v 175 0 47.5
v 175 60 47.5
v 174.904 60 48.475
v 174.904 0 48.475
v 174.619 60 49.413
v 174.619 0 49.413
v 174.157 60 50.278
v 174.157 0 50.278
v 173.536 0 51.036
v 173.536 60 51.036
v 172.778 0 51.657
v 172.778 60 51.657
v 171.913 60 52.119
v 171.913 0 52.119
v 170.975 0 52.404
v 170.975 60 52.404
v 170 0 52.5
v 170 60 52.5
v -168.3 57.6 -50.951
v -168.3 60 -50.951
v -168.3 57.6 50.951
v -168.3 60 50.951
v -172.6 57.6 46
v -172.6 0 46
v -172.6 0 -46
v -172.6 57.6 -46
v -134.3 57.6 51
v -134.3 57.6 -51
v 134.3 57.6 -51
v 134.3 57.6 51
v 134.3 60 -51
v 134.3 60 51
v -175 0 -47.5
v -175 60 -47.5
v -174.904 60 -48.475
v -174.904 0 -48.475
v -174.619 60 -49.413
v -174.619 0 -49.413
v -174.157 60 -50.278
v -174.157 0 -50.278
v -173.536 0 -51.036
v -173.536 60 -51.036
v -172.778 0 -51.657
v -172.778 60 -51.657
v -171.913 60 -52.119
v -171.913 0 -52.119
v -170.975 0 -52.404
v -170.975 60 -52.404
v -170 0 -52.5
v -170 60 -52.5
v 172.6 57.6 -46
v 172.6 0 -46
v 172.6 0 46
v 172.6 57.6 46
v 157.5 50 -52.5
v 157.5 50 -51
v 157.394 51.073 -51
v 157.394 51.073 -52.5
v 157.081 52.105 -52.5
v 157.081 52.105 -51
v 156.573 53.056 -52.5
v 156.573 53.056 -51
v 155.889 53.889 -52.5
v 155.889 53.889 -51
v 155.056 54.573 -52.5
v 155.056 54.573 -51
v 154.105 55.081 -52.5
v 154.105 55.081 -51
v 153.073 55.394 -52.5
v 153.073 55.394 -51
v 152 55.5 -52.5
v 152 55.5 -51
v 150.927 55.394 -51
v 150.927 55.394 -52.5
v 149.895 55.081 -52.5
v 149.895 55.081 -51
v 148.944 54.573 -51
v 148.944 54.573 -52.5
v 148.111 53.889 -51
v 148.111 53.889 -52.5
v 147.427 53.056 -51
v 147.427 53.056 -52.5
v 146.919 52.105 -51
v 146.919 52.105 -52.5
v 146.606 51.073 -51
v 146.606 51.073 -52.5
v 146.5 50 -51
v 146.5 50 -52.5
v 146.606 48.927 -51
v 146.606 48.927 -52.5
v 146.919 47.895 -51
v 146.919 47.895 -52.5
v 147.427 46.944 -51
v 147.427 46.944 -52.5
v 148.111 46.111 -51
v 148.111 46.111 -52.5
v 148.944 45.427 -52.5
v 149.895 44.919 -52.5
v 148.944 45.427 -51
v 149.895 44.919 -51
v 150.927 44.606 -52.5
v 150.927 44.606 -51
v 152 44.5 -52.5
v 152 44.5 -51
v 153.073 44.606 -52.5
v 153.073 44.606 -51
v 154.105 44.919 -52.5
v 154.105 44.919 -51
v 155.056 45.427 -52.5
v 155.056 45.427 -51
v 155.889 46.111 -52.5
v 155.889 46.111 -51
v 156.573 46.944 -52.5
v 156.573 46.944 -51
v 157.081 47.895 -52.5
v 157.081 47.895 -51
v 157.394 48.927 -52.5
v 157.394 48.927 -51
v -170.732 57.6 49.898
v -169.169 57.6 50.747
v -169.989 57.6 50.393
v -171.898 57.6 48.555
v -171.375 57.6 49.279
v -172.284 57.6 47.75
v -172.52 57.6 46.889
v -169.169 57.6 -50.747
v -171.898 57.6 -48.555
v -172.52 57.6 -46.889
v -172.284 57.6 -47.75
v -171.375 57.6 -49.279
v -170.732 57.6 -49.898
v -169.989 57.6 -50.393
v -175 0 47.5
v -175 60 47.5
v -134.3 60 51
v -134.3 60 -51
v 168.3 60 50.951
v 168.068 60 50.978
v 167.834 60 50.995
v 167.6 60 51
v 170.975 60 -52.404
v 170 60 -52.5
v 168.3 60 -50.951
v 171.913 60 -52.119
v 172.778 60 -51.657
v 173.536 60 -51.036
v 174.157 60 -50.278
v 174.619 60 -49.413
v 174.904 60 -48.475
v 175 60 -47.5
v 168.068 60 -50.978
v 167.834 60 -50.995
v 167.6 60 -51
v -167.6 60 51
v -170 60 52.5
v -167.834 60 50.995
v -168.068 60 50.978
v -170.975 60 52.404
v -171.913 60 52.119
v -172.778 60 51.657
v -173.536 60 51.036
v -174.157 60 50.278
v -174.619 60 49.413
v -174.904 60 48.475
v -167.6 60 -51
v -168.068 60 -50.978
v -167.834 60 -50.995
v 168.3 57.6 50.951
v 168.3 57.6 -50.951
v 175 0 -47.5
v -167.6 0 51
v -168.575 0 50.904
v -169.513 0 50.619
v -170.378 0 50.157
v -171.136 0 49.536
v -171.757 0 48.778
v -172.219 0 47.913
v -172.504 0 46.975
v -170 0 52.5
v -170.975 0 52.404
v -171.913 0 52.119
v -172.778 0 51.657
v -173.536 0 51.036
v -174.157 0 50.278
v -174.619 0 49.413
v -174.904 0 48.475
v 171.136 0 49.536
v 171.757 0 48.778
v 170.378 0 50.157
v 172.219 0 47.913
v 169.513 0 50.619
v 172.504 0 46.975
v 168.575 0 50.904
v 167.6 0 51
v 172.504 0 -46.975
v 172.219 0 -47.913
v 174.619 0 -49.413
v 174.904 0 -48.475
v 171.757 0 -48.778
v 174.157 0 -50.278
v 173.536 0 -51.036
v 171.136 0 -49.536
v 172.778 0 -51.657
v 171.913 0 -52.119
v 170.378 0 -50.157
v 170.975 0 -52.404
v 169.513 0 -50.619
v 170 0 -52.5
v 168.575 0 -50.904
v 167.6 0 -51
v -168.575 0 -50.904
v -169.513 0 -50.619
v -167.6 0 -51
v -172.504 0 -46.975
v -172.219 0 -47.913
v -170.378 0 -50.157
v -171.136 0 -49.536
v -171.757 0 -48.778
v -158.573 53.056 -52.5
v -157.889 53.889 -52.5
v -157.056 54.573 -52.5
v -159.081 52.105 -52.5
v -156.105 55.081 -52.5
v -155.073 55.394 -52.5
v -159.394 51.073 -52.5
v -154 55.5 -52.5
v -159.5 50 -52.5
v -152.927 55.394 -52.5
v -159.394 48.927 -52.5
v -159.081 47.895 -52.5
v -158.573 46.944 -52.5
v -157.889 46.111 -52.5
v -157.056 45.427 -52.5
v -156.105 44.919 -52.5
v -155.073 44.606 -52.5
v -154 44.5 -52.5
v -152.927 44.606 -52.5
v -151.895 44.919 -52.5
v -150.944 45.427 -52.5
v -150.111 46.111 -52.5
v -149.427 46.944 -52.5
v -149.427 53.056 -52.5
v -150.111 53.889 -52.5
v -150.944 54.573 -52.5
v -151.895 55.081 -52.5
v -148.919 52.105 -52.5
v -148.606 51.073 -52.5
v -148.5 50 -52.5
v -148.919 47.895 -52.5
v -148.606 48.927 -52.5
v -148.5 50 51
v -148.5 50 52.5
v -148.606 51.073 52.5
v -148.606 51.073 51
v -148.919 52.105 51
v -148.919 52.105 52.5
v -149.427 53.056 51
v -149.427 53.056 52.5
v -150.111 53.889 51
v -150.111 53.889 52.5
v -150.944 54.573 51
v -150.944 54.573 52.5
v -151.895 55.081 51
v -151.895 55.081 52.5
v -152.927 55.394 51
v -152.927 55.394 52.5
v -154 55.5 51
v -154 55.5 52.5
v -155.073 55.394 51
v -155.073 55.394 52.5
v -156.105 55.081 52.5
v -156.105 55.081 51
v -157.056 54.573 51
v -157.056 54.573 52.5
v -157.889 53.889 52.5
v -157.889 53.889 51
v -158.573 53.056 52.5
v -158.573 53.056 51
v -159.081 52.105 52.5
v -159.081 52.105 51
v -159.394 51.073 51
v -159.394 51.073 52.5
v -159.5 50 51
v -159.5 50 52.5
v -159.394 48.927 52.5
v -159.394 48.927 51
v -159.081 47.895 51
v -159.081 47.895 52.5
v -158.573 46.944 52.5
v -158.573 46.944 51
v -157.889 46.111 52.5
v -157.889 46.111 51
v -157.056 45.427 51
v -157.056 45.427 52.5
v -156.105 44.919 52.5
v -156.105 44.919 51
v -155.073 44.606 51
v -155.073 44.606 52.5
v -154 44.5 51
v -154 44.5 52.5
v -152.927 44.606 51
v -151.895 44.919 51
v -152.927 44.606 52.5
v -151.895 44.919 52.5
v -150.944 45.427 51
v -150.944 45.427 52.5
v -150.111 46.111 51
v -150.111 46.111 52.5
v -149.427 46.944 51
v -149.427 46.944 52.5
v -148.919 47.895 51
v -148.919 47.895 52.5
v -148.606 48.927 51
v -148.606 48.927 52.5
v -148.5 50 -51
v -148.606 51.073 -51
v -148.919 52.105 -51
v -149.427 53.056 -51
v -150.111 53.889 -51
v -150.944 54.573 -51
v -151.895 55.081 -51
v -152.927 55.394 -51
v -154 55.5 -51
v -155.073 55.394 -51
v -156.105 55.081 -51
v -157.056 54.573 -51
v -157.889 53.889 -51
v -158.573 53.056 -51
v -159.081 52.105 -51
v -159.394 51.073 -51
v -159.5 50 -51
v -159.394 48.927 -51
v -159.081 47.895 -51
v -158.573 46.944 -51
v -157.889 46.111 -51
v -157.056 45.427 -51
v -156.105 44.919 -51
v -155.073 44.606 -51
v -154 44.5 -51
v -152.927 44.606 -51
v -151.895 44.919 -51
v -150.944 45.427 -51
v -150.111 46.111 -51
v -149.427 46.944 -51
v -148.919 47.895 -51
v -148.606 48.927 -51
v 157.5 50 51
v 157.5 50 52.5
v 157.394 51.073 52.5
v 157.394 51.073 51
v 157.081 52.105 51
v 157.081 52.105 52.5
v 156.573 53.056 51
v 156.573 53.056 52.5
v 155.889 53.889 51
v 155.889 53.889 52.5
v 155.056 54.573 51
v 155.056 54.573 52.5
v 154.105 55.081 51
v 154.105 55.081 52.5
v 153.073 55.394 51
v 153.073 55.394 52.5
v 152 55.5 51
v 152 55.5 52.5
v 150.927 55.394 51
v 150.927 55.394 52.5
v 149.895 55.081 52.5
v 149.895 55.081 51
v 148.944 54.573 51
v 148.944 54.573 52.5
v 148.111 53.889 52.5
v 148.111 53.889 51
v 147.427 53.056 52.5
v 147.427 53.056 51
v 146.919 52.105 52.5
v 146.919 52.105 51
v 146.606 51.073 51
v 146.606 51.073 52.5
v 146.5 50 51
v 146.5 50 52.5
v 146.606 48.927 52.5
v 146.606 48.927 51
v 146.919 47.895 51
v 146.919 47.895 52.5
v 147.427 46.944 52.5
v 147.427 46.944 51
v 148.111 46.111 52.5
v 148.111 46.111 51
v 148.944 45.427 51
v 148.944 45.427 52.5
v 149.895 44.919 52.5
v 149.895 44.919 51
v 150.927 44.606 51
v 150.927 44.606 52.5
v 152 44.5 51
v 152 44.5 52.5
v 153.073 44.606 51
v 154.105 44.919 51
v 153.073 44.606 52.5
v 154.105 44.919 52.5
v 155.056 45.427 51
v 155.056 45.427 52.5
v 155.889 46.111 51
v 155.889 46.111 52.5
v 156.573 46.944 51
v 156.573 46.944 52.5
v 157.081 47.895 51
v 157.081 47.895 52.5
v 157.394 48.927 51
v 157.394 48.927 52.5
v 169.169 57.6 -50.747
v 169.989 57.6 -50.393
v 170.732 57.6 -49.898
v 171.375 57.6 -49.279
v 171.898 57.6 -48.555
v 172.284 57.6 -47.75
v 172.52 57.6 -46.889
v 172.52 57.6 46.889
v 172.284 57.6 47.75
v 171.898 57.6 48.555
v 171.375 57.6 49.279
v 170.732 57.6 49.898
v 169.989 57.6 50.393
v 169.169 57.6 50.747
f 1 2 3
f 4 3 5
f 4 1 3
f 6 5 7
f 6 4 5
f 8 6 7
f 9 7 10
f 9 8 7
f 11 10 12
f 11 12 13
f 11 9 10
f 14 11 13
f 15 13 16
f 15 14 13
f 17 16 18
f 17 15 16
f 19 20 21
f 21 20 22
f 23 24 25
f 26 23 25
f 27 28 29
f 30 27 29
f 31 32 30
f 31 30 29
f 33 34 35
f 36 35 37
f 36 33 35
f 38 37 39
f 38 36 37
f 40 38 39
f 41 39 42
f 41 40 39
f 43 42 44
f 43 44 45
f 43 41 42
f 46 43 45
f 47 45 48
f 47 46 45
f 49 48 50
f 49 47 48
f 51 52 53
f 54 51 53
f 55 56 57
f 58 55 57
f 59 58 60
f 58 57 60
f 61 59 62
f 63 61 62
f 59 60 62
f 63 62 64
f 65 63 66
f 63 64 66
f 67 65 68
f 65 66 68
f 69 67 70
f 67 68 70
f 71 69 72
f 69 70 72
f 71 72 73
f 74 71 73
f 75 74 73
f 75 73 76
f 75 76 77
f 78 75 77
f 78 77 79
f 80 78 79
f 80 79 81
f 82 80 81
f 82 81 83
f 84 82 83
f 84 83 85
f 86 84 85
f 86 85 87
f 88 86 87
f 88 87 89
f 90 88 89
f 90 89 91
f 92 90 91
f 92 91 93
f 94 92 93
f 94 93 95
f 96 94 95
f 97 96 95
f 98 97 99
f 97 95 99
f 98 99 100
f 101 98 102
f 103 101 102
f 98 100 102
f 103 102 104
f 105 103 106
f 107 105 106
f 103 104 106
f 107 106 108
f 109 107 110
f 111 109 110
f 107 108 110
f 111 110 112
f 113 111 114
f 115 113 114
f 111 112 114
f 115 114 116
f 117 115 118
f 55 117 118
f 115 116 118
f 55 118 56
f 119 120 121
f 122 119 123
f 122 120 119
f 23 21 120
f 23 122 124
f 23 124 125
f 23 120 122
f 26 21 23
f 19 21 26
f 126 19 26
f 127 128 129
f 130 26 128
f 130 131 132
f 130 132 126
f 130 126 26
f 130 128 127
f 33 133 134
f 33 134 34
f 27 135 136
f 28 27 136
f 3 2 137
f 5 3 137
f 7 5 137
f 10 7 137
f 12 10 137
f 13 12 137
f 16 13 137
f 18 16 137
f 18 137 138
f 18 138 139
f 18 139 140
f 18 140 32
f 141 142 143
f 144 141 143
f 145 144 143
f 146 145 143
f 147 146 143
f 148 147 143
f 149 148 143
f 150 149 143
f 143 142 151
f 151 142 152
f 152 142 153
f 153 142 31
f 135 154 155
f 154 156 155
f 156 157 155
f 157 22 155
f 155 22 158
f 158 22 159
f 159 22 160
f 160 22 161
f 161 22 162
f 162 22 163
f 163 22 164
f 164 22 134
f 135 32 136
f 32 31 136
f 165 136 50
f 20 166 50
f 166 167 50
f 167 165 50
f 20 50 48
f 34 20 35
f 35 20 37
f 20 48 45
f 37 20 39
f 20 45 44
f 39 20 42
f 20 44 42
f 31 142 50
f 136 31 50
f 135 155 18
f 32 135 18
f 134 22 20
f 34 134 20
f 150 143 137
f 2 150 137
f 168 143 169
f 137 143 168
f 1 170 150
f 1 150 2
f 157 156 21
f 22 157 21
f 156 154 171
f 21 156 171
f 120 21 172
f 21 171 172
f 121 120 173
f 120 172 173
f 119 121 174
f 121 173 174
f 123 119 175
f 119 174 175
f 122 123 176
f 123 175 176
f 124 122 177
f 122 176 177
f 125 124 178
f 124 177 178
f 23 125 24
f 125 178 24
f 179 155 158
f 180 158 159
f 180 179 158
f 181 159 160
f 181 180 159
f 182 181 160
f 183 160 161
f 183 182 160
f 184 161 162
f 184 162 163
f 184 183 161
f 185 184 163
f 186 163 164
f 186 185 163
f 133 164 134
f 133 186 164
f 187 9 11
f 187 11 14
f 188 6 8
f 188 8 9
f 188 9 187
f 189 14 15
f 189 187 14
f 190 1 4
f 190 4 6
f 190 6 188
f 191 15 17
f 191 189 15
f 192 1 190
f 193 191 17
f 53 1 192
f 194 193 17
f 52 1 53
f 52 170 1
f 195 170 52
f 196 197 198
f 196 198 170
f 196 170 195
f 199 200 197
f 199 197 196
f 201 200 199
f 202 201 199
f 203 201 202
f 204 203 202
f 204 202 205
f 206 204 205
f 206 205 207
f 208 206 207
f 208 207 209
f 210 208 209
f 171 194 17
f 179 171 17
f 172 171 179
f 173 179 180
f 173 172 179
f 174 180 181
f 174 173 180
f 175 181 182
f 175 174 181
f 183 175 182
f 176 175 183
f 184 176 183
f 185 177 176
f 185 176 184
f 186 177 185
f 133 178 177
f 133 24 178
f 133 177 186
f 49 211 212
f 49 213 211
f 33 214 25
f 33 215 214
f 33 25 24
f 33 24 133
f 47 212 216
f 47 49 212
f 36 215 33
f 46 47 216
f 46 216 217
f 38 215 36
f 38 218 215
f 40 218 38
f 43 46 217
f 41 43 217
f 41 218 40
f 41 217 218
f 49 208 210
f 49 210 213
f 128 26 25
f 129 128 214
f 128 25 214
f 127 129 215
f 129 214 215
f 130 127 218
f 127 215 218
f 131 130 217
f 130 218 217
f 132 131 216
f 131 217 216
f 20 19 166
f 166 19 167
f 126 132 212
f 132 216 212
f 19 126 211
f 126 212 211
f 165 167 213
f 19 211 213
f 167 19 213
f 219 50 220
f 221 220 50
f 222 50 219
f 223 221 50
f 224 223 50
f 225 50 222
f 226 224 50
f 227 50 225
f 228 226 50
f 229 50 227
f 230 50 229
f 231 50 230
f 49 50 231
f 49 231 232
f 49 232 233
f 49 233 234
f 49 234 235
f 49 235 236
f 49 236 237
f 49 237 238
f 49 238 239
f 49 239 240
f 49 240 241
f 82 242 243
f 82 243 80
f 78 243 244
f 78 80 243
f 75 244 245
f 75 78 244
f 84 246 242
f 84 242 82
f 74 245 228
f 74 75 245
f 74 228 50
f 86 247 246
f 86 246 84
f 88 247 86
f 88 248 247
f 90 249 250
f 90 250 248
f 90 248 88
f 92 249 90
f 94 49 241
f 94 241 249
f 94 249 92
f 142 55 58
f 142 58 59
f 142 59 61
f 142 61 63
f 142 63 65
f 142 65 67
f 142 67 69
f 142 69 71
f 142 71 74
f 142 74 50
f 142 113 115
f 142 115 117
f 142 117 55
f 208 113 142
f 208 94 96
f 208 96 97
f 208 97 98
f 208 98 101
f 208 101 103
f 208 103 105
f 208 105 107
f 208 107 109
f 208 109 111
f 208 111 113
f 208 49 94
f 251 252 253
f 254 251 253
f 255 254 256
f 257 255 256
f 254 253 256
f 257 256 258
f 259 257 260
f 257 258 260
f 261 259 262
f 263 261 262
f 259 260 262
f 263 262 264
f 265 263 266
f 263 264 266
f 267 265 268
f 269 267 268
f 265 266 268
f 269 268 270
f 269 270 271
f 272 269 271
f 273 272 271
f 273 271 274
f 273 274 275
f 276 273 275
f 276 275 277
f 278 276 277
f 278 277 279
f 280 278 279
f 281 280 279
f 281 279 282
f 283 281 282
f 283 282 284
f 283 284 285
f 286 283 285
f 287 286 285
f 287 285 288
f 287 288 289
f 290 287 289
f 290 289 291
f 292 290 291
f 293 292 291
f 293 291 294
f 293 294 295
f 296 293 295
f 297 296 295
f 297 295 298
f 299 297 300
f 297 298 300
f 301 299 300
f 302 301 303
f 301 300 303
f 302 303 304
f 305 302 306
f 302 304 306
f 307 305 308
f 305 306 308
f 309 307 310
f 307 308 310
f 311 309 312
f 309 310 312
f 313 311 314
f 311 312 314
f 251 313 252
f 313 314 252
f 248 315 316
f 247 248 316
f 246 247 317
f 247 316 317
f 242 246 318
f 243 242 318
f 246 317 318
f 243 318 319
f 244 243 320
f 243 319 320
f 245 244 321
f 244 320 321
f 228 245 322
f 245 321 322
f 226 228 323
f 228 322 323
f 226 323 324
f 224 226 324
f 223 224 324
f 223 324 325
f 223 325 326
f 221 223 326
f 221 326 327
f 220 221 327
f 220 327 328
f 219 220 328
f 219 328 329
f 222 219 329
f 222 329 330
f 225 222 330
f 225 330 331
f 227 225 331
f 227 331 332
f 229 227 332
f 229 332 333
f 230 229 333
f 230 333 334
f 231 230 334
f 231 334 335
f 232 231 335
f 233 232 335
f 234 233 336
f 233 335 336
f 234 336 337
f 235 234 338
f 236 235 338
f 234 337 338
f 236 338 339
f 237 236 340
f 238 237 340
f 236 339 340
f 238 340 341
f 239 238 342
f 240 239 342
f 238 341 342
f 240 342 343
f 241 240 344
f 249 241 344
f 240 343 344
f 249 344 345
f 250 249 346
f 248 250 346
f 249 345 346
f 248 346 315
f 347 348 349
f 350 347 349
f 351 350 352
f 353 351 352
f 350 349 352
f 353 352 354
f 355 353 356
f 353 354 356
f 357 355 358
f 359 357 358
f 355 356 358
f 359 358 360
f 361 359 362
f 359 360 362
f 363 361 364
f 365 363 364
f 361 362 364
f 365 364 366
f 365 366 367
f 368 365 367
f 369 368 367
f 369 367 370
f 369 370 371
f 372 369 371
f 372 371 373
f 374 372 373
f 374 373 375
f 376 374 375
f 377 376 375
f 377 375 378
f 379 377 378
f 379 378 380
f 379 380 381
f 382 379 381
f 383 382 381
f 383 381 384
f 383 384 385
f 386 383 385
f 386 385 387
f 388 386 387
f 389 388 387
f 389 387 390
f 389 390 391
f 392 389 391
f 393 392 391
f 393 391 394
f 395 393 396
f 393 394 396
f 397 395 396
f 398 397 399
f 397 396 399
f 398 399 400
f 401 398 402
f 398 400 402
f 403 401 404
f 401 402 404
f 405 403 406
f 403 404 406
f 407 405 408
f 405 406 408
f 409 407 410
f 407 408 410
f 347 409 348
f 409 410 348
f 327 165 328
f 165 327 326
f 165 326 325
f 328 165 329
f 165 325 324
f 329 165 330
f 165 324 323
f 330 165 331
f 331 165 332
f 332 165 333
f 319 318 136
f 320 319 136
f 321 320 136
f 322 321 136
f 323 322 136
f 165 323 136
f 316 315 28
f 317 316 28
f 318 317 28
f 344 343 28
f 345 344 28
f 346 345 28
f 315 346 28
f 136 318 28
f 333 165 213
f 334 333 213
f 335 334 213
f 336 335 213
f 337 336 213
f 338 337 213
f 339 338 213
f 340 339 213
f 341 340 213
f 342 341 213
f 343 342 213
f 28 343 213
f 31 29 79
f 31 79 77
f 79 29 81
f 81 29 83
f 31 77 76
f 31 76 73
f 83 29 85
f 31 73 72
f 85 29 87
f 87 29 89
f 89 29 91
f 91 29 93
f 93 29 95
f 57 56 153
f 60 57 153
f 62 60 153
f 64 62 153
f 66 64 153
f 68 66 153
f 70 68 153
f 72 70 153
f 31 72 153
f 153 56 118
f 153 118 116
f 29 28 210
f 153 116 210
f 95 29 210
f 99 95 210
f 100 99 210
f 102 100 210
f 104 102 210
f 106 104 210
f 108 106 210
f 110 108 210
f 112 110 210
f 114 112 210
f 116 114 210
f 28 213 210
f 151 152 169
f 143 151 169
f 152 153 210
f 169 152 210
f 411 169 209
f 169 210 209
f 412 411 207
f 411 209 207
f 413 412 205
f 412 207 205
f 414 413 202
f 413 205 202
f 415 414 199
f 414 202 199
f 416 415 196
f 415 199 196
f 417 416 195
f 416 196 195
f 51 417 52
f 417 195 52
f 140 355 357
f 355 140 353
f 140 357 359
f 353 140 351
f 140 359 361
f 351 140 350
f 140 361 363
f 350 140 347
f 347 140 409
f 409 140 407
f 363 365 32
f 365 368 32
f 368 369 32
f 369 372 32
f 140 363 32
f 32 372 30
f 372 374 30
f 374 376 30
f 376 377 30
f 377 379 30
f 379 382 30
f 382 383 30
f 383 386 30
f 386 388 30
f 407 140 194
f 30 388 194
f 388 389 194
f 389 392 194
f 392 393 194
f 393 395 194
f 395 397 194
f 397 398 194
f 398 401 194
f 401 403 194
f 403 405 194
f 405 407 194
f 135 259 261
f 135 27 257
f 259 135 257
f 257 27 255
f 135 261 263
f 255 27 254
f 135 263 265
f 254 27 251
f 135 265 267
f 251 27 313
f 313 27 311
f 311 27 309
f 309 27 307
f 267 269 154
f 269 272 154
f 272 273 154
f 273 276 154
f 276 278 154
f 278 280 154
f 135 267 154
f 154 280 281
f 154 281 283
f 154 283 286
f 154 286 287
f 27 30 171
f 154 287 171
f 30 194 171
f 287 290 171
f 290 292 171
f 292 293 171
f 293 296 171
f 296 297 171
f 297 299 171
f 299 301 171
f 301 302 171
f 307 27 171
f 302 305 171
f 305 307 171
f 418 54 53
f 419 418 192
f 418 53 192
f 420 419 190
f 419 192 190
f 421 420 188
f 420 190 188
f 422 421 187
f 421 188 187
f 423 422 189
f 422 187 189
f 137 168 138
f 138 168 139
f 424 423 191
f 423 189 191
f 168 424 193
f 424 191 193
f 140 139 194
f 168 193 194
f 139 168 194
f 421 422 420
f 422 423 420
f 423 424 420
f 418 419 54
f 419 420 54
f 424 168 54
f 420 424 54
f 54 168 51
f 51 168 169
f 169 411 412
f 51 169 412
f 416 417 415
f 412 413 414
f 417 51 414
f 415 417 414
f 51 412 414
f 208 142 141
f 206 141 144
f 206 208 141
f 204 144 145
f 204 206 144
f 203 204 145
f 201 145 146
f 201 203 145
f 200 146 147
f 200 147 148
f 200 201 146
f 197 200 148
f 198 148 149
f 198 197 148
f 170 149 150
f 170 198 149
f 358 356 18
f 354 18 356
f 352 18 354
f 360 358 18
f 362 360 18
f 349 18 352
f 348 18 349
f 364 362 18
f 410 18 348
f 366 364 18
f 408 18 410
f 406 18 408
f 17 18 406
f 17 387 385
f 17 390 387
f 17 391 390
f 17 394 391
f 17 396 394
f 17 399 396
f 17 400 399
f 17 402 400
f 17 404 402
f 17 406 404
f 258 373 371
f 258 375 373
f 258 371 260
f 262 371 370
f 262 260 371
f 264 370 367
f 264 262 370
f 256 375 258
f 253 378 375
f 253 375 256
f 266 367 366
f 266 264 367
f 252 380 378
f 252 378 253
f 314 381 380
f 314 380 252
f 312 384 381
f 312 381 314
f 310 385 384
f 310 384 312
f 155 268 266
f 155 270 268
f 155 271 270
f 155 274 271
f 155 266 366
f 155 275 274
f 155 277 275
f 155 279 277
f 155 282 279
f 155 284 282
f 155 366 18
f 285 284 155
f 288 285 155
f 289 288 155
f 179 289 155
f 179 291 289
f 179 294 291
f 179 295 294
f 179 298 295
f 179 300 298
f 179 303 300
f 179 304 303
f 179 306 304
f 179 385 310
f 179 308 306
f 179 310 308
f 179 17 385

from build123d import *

# Parameters (mm, degrees)
SALIENTE_EXTRUIR1_DEPTH = 60
CROQUIS3_W              = 268.6
CROQUIS3_H              = 105
SALIENTE_EXTRUIR4_DEPTH = 2.4
CROQUIS4_R              = 5.5
CORTAR_EXTRUIR1_DEPTH   = 106


with BuildPart() as part:
    # Croquis2 → Saliente-Extruir1 (new body)
    with BuildSketch(Plane(origin=(0, 0, 0), x_dir=(1, 0, 0), z_dir=(0, 1, 0))):
        with BuildLine():
            Line((-170, 52.5), (170, 52.5))
            ThreePointArc((170, 52.5), (173.535533906, 51.035533906), (175, 47.5))
            Line((175, 47.5), (175, -47.5))
            ThreePointArc((175, -47.5), (173.535533906, -51.035533906), (170, -52.5))
            Line((170, -52.5), (-170, -52.5))
            ThreePointArc((-170, -52.5), (-173.535533906, -51.035533906), (-175, -47.5))
            Line((-175, -47.5), (-175, 47.5))
            ThreePointArc((-175, 47.5), (-173.535533906, 51.035533906), (-170, 52.5))
        make_face()
        with BuildLine():
            Line((-167.6, 51), (167.6, 51))
            ThreePointArc((167.6, 51), (171.135533906, 49.535533906), (172.6, 46))
            Line((172.6, 46), (172.6, -46))
            ThreePointArc((172.6, -46), (171.135533906, -49.535533906), (167.6, -51))
            Line((167.6, -51), (-167.6, -51))
            ThreePointArc((-167.6, -51), (-171.135533906, -49.535533906), (-172.6, -46))
            Line((-172.6, -46), (-172.6, 46))
            ThreePointArc((-172.6, 46), (-171.135533906, 49.535533906), (-167.6, 51))
        make_face(mode=Mode.SUBTRACT)
    extrude(amount=SALIENTE_EXTRUIR1_DEPTH)

    # Croquis3 → Saliente-Extruir4 (add)
    with BuildSketch(Plane(origin=(0, 60, 0), x_dir=(1, 0, 0), z_dir=(0, 1, 0))):
        with BuildLine():
            Line((-170, 52.5), (-168.3, 52.5))
            Line((-168.3, 52.5), (-168.3, -52.5))
            Line((-168.3, -52.5), (-170, -52.5))
            ThreePointArc((-170, -52.5), (-173.535533906, -51.035533906), (-175, -47.5))
            Line((-175, -47.5), (-175, 47.5))
            ThreePointArc((-175, 47.5), (-173.535533906, 51.035533906), (-170, 52.5))
        make_face()
        with BuildLine():
            Line((170, 52.5), (168.3, 52.5))
            Line((168.3, 52.5), (168.3, -52.5))
            Line((168.3, -52.5), (170, -52.5))
            ThreePointArc((170, -52.5), (173.535533906, -51.035533906), (175, -47.5))
            Line((175, -47.5), (175, 47.5))
            ThreePointArc((175, 47.5), (173.535533906, 51.035533906), (170, 52.5))
        make_face()
        Rectangle(CROQUIS3_W, CROQUIS3_H)
    extrude(amount=-SALIENTE_EXTRUIR4_DEPTH)

    # Croquis4 → Cortar-Extruir1 (cut, through all)
    with BuildSketch(Plane.XY.offset(52.5)):
        with Locations((152, 50)):
            Circle(CROQUIS4_R)
        with Locations((-154, 50)):
            Circle(CROQUIS4_R)
    extrude(amount=-CORTAR_EXTRUIR1_DEPTH, mode=Mode.SUBTRACT)


solid = part.part
